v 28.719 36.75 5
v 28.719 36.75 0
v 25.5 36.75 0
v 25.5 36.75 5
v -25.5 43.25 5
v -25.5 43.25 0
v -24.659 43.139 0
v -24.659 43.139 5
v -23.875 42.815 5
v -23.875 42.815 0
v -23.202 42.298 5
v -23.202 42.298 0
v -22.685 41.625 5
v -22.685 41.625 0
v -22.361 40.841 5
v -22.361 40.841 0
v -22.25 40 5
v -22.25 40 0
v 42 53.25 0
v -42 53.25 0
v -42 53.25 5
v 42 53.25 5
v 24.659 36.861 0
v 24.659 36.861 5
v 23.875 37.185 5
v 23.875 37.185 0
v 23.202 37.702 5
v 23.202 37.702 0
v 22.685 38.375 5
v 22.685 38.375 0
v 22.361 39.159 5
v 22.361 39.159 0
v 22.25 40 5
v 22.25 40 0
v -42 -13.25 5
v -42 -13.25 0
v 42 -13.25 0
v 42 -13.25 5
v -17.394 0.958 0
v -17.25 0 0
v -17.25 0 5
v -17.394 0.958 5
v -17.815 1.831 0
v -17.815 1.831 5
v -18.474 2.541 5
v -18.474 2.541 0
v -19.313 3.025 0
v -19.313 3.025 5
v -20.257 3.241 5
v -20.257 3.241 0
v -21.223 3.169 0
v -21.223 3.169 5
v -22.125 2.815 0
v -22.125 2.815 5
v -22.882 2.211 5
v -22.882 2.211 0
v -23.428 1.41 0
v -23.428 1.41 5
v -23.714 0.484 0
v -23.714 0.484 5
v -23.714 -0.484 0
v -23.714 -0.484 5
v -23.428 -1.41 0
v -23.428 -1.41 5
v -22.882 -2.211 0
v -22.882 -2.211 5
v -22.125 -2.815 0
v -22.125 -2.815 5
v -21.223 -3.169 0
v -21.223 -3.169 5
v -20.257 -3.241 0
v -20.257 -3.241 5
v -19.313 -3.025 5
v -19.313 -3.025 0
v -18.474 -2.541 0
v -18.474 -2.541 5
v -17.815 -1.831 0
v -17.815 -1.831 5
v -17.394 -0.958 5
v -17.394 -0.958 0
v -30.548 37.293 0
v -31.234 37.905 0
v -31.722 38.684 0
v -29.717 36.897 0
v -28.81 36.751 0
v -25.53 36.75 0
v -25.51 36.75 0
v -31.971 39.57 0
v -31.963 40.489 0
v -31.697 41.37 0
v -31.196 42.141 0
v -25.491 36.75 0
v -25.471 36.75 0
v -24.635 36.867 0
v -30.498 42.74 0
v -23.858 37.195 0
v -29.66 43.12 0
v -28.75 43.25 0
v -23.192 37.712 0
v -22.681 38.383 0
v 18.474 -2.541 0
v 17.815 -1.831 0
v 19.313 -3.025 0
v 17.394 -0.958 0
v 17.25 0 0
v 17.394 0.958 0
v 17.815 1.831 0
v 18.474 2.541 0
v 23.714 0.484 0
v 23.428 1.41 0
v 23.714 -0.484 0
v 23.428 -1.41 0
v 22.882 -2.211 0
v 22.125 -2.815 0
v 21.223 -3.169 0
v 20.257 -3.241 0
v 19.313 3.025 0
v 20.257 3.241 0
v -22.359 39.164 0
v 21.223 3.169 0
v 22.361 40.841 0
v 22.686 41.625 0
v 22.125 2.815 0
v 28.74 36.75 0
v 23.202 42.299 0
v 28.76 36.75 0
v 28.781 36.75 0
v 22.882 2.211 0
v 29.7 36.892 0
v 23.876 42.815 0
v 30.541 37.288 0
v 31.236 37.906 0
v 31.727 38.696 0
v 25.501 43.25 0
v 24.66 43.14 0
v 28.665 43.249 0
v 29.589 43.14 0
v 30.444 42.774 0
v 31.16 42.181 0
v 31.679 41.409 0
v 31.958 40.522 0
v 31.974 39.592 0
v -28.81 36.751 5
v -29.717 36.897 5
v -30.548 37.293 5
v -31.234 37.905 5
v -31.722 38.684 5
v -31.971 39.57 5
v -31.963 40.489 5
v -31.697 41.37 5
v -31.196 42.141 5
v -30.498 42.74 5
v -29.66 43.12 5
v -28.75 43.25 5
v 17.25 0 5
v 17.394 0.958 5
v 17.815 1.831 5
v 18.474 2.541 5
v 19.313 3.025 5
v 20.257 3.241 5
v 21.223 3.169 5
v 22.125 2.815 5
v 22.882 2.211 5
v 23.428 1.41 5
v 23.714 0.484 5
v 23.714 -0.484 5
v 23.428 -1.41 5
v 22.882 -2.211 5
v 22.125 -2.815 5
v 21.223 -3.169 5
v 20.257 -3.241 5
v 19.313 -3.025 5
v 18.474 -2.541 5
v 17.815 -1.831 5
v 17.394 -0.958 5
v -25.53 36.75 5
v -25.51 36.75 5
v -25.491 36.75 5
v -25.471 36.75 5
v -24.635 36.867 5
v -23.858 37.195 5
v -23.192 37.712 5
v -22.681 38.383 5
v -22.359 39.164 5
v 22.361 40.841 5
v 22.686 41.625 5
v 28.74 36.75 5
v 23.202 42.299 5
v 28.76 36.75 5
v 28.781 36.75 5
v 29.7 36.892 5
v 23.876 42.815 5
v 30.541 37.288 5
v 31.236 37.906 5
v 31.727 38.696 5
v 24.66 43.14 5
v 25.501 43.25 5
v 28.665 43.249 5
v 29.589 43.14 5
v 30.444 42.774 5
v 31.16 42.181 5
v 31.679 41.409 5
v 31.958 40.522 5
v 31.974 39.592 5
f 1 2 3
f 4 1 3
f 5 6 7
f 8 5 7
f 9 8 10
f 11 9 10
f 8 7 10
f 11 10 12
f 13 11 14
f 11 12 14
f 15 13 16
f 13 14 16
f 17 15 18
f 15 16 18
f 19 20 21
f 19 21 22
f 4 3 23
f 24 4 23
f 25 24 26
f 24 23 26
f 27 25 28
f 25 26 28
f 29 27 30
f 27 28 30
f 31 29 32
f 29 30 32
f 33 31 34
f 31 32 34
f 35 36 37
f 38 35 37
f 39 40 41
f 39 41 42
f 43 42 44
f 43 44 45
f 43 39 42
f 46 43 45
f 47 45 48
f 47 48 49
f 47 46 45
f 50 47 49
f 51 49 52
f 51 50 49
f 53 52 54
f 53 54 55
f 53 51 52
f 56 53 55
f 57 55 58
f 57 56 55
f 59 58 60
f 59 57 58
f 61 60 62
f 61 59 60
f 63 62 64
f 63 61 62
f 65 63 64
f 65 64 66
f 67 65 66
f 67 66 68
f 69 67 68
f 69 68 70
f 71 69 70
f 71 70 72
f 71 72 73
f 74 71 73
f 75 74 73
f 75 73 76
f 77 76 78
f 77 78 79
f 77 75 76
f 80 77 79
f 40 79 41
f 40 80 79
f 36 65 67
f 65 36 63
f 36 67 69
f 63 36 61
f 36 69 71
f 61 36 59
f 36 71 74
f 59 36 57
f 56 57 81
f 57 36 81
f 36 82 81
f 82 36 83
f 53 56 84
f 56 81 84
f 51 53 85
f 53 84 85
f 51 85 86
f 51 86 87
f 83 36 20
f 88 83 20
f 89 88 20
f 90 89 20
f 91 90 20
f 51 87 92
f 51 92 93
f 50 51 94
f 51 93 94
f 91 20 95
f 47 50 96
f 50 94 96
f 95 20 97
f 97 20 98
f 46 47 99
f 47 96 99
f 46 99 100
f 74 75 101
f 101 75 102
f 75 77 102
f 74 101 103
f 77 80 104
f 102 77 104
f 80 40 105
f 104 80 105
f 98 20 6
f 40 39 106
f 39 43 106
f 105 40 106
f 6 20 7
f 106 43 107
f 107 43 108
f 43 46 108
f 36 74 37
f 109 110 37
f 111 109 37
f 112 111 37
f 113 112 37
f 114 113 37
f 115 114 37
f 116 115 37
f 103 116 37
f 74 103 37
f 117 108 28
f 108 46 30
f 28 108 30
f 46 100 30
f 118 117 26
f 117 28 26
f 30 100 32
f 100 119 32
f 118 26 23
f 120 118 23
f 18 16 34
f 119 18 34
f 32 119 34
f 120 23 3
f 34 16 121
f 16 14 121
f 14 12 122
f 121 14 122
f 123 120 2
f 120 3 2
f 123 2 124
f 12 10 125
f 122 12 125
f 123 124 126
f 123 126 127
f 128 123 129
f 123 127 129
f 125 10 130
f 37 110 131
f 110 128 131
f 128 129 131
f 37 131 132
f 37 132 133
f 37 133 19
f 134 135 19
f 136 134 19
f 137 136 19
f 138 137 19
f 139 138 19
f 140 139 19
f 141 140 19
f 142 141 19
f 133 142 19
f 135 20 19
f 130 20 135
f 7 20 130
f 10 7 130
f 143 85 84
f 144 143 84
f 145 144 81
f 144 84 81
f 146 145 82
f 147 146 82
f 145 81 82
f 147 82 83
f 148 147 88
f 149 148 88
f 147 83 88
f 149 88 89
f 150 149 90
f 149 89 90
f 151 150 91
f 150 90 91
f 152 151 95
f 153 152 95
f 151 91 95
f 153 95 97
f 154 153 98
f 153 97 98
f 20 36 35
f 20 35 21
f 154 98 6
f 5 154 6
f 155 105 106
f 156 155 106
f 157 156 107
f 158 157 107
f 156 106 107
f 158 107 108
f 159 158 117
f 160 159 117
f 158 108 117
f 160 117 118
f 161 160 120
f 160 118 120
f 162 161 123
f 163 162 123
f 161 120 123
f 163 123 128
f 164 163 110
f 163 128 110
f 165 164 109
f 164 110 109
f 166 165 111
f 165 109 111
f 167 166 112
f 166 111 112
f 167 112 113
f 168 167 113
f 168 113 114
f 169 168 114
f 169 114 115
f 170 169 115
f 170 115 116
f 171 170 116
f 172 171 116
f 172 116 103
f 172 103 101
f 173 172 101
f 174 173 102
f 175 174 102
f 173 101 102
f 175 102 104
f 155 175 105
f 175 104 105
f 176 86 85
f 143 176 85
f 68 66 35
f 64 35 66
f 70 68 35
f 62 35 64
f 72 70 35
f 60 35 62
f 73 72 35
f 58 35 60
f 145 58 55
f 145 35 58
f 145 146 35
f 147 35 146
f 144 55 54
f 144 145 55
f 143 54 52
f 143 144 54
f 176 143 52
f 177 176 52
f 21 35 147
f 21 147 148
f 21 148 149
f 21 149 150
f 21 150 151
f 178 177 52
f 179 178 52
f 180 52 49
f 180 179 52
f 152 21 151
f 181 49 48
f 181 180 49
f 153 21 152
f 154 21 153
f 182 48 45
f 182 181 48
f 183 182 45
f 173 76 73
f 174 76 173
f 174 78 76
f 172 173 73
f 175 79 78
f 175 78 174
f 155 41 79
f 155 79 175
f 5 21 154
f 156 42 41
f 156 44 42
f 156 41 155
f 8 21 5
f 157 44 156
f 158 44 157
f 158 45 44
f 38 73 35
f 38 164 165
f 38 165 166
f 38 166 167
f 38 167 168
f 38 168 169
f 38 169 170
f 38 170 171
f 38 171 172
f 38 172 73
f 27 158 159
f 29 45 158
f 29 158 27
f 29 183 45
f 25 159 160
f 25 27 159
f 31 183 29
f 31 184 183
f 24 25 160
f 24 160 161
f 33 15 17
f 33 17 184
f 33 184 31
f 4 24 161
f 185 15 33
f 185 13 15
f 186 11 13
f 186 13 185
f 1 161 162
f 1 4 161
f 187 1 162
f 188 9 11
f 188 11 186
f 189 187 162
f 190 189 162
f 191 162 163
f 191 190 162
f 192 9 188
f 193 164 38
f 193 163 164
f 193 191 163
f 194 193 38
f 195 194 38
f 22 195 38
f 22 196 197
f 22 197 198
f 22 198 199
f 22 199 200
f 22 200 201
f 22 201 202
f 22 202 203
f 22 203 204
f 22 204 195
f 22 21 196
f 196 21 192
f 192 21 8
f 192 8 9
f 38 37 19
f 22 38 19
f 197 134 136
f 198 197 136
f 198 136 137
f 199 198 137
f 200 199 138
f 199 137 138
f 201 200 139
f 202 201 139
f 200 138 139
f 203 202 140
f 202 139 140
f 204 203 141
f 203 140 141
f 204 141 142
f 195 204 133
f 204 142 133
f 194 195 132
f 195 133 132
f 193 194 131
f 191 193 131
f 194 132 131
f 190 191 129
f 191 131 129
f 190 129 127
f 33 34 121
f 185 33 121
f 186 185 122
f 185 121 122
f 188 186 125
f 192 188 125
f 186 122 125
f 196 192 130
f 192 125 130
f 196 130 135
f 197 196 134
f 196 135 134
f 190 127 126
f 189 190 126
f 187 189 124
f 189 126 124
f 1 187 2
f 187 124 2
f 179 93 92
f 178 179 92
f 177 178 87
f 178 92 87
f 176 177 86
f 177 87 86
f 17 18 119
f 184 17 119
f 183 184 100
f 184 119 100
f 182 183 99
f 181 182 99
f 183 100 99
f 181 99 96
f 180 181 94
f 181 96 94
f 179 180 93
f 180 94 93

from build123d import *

# Parameters (mm, degrees)
F0_W     = 84
F0_H     = 66.5
F0_R     = 3.25
F1_DEPTH = 5


with BuildPart() as f1:
    # F0 (on Top) → F1 (new body)
    with BuildSketch(Plane.XY):
        with Locations((0, 20)):
            Rectangle(F0_W, F0_H)
        with Locations((-20.5, 0)):
            Circle(F0_R, mode=Mode.SUBTRACT)
        with BuildLine():
            ThreePointArc((23.75, 0), (20.5, -3.25), (17.25, 0))
            ThreePointArc((17.25, 0), (20.5, 3.25), (23.75, 0))
        make_face(mode=Mode.SUBTRACT)
        with BuildLine():
            ThreePointArc((-25.5, 43.25), (-23.201903, 42.298097), (-22.25, 40))
            ThreePointArc((-22.25, 40), (-23.19161, 37.712242), (-25.470823, 36.750131))
            ThreePointArc((-25.470823, 36.750131), (-25.500403, 36.75), (-25.529982, 36.750138))
            Line((-25.529982, 36.750138), (-28.809505, 36.750545))
            ThreePointArc((-28.809505, 36.750545), (-31.999864, 40.029754), (-28.75, 43.25))
            Line((-28.75, 43.25), (-25.5, 43.25))
        make_face(mode=Mode.SUBTRACT)
        with BuildLine():
            ThreePointArc((25.500037, 36.75), (23.201916, 37.70189), (22.25, 40))
            ThreePointArc((22.25, 40), (23.202345, 42.298539), (25.501249, 43.25))
            Line((25.501249, 43.25), (28.665276, 43.248784))
            ThreePointArc((28.665276, 43.248784), (31.999484, 40.057825), (28.781145, 36.750038))
            ThreePointArc((28.781145, 36.750038), (28.750037, 36.749888), (28.718929, 36.750037))
            Line((28.718929, 36.750037), (25.500037, 36.75))
        make_face(mode=Mode.SUBTRACT)
    extrude(amount=F1_DEPTH)


solid = f1.part
